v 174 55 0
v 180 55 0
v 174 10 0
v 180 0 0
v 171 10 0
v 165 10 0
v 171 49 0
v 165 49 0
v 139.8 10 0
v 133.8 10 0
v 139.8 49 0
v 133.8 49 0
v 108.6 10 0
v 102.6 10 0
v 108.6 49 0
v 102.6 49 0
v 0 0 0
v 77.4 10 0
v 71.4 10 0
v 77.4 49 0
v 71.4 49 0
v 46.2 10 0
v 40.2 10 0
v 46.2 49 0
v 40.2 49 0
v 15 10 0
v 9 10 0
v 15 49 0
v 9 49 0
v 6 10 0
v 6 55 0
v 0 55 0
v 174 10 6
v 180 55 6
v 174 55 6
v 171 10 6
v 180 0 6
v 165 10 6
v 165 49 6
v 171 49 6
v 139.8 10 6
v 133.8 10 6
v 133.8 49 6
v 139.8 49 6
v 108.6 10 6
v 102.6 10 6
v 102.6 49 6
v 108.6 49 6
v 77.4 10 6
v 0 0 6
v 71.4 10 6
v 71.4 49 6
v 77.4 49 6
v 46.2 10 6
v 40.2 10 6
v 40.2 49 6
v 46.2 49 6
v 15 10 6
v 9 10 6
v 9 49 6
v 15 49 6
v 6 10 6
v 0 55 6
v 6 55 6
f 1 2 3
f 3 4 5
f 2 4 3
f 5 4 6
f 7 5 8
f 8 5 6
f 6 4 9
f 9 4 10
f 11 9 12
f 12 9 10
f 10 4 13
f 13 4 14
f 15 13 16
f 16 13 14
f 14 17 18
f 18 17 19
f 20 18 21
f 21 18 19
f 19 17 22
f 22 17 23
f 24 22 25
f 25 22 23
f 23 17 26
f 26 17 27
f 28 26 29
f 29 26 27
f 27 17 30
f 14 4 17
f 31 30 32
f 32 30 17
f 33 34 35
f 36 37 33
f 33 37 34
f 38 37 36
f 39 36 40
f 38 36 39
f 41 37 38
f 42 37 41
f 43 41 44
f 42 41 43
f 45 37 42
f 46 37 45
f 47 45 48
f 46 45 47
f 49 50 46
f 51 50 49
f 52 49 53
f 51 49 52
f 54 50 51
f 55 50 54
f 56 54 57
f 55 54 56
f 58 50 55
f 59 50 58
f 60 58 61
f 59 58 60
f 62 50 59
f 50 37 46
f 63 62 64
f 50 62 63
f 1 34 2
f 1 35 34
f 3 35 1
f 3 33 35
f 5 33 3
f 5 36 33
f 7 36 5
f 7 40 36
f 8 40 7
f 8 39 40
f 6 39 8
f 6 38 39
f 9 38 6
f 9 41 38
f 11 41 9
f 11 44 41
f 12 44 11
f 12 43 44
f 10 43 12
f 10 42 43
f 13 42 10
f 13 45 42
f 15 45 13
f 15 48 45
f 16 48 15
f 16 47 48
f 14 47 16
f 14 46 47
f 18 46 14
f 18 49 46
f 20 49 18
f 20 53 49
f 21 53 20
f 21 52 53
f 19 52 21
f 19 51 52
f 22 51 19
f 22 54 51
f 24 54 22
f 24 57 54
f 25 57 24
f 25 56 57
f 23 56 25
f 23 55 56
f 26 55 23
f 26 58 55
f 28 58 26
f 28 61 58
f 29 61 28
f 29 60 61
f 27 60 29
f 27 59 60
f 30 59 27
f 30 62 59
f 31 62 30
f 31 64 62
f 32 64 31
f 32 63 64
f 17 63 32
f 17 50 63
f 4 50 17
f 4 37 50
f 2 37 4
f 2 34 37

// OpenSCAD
$fn = 32;

// ----------------------------------------------------------------------
// Guard grille: 6 slats over a 180 x 55 mm plate
// ----------------------------------------------------------------------

// --- parameters (mm) ---
profile_height = 6;       // extrusion height
profile_points = 32;      // points of the closed outline

profile = [[0, 0], [180, 0], [180, 55], [174, 55], [174, 10], [171, 10], [171, 49], [165, 49], [165, 10], [139.8, 10], [139.8, 49], [133.8, 49], [133.8, 10], [108.6, 10], [108.6, 49], [102.6, 49], [102.6, 10], [77.4, 10], [77.4, 49], [71.4, 49], [71.4, 10], [46.2, 10], [46.2, 49], [40.2, 49], [40.2, 10], [15, 10], [15, 49], [9, 49], [9, 10], [6, 10], [6, 55], [0, 55]];  // single closed polygon, 32 points, counter clockwise

// --- the one profile operation ---
linear_extrude(height = profile_height) polygon(points = profile);
